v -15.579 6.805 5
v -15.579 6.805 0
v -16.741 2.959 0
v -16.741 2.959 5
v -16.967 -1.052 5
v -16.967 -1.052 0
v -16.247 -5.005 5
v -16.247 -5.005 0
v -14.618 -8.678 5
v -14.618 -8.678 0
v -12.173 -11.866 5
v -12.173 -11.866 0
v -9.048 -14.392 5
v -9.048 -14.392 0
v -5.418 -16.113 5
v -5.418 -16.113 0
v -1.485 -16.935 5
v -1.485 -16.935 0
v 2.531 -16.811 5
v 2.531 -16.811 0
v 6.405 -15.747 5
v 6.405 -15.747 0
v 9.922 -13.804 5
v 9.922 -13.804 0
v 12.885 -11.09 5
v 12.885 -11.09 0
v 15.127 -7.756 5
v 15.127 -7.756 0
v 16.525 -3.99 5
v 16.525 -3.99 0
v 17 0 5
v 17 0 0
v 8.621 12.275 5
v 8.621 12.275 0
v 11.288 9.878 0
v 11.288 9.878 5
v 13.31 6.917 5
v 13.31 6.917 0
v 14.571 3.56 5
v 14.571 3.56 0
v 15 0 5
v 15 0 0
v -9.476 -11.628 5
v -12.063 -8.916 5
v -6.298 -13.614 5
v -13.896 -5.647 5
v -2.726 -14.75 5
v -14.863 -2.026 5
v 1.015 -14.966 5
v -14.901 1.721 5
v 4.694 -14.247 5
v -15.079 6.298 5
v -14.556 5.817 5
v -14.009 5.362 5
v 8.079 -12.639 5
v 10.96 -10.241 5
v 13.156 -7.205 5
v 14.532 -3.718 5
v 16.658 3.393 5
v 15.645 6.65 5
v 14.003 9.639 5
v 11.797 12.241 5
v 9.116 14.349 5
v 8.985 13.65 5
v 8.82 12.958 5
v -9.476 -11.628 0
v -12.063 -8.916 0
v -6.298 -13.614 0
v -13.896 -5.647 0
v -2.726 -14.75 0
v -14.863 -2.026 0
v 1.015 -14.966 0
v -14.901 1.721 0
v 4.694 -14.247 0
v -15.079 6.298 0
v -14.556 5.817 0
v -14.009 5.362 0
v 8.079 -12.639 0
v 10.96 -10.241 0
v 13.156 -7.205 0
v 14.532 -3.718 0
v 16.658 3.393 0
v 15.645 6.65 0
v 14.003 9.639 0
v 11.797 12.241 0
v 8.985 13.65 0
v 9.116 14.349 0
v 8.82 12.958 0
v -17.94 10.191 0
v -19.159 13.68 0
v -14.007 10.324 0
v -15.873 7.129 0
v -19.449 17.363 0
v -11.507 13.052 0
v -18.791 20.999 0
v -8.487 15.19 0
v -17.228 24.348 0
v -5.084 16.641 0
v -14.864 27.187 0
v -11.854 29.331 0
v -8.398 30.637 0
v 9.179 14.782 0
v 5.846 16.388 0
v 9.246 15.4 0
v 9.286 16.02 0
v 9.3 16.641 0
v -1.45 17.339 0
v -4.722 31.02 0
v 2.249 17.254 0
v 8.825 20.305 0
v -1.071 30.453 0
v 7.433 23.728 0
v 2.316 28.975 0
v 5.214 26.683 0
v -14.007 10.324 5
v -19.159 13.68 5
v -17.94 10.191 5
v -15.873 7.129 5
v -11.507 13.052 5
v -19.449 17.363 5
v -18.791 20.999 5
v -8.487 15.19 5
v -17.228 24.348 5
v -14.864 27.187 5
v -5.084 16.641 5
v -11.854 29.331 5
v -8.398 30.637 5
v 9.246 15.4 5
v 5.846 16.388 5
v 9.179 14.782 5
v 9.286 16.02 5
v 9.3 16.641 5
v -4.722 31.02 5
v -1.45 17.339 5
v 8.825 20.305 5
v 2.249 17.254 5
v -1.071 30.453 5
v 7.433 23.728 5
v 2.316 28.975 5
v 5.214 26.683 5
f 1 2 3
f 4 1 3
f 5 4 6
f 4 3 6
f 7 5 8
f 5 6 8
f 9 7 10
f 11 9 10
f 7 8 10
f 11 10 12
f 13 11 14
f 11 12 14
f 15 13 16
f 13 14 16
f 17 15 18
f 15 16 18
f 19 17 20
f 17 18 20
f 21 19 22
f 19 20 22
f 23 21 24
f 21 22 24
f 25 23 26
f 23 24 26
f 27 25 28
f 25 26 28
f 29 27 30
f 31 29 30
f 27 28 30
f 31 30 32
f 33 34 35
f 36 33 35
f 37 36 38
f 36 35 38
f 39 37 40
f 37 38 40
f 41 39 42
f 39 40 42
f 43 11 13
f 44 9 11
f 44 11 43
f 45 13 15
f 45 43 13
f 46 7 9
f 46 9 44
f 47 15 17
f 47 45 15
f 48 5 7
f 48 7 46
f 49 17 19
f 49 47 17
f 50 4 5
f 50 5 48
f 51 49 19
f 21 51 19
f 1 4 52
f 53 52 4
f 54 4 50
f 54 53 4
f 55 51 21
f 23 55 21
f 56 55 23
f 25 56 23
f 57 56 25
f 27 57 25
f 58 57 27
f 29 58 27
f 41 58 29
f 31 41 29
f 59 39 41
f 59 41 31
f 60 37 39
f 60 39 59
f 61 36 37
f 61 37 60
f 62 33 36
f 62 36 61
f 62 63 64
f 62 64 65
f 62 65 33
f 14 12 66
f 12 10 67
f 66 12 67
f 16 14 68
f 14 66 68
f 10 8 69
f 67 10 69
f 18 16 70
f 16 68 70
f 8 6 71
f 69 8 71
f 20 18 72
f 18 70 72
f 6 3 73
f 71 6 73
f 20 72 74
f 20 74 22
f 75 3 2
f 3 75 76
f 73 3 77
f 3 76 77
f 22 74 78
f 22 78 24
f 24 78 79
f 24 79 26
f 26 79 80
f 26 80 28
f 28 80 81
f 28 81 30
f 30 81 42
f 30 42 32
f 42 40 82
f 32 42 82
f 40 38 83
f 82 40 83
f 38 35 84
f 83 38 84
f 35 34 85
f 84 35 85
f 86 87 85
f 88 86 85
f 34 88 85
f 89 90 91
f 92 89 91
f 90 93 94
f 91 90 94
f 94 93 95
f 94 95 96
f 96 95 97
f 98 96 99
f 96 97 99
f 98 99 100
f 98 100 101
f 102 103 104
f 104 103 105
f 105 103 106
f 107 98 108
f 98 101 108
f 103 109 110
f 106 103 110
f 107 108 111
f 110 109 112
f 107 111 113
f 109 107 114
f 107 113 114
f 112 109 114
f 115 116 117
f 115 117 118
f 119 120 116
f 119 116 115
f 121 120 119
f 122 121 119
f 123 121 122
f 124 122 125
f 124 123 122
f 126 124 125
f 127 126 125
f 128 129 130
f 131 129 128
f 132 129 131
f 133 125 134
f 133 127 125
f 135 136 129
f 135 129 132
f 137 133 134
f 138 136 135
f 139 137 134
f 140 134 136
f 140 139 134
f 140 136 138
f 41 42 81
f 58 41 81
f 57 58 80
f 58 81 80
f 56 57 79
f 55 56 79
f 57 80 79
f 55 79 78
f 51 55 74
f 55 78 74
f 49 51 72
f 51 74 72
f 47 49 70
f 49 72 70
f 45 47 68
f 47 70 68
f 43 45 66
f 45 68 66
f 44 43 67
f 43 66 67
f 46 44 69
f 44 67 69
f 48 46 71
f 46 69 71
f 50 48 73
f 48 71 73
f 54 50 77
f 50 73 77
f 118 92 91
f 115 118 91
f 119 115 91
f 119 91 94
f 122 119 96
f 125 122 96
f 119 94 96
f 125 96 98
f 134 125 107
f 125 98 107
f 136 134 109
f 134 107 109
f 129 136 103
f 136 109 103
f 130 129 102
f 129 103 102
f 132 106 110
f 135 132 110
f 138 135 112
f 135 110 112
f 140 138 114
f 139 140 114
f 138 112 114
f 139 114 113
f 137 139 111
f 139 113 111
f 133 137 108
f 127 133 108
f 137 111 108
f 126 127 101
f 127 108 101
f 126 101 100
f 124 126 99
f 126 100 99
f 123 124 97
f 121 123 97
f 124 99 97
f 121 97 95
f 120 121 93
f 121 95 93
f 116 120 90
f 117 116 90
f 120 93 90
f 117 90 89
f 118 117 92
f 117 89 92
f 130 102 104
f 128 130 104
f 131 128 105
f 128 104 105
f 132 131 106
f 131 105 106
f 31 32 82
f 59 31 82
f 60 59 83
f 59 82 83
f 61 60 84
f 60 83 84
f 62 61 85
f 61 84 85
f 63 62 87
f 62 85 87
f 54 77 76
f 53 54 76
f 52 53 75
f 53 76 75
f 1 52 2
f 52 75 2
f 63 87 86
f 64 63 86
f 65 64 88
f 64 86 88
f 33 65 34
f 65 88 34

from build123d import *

# Parameters (mm, degrees)
F1_DEPTH = 5


with BuildPart() as f1:
    # F0 (on Top) → F1 (new body)
    with BuildSketch(Plane.XY):
        with BuildLine():
            ThreePointArc((-15.872671, 7.128697), (-5.083628, 16.640815), (9.17919, 14.781829))
            ThreePointArc((9.17919, 14.781829), (9.269637, 15.709367), (9.299828, 16.640815))
            ThreePointArc((9.299828, 16.640815), (-10.167922, 30.095694), (-15.872671, 7.128697))
        make_face()
        with BuildLine():
            ThreePointArc((8.621227, 12.274952), (13.310117, 6.916704), (15, 0))
            ThreePointArc((15, 0), (-2.726202, -14.75018), (-14.009043, 5.361596))
            ThreePointArc((-14.009043, 5.361596), (-14.820571, 6.054231), (-15.578524, 6.805115))
            ThreePointArc((-15.578524, 6.805115), (-3.475996, -16.640837), (17, 0))
            ThreePointArc((17, 0), (14.899219, 8.186163), (9.116087, 14.34911))
            ThreePointArc((9.116087, 14.34911), (8.907147, 13.302848), (8.621227, 12.274952))
        make_face()
    extrude(amount=F1_DEPTH)


solid = f1.part
